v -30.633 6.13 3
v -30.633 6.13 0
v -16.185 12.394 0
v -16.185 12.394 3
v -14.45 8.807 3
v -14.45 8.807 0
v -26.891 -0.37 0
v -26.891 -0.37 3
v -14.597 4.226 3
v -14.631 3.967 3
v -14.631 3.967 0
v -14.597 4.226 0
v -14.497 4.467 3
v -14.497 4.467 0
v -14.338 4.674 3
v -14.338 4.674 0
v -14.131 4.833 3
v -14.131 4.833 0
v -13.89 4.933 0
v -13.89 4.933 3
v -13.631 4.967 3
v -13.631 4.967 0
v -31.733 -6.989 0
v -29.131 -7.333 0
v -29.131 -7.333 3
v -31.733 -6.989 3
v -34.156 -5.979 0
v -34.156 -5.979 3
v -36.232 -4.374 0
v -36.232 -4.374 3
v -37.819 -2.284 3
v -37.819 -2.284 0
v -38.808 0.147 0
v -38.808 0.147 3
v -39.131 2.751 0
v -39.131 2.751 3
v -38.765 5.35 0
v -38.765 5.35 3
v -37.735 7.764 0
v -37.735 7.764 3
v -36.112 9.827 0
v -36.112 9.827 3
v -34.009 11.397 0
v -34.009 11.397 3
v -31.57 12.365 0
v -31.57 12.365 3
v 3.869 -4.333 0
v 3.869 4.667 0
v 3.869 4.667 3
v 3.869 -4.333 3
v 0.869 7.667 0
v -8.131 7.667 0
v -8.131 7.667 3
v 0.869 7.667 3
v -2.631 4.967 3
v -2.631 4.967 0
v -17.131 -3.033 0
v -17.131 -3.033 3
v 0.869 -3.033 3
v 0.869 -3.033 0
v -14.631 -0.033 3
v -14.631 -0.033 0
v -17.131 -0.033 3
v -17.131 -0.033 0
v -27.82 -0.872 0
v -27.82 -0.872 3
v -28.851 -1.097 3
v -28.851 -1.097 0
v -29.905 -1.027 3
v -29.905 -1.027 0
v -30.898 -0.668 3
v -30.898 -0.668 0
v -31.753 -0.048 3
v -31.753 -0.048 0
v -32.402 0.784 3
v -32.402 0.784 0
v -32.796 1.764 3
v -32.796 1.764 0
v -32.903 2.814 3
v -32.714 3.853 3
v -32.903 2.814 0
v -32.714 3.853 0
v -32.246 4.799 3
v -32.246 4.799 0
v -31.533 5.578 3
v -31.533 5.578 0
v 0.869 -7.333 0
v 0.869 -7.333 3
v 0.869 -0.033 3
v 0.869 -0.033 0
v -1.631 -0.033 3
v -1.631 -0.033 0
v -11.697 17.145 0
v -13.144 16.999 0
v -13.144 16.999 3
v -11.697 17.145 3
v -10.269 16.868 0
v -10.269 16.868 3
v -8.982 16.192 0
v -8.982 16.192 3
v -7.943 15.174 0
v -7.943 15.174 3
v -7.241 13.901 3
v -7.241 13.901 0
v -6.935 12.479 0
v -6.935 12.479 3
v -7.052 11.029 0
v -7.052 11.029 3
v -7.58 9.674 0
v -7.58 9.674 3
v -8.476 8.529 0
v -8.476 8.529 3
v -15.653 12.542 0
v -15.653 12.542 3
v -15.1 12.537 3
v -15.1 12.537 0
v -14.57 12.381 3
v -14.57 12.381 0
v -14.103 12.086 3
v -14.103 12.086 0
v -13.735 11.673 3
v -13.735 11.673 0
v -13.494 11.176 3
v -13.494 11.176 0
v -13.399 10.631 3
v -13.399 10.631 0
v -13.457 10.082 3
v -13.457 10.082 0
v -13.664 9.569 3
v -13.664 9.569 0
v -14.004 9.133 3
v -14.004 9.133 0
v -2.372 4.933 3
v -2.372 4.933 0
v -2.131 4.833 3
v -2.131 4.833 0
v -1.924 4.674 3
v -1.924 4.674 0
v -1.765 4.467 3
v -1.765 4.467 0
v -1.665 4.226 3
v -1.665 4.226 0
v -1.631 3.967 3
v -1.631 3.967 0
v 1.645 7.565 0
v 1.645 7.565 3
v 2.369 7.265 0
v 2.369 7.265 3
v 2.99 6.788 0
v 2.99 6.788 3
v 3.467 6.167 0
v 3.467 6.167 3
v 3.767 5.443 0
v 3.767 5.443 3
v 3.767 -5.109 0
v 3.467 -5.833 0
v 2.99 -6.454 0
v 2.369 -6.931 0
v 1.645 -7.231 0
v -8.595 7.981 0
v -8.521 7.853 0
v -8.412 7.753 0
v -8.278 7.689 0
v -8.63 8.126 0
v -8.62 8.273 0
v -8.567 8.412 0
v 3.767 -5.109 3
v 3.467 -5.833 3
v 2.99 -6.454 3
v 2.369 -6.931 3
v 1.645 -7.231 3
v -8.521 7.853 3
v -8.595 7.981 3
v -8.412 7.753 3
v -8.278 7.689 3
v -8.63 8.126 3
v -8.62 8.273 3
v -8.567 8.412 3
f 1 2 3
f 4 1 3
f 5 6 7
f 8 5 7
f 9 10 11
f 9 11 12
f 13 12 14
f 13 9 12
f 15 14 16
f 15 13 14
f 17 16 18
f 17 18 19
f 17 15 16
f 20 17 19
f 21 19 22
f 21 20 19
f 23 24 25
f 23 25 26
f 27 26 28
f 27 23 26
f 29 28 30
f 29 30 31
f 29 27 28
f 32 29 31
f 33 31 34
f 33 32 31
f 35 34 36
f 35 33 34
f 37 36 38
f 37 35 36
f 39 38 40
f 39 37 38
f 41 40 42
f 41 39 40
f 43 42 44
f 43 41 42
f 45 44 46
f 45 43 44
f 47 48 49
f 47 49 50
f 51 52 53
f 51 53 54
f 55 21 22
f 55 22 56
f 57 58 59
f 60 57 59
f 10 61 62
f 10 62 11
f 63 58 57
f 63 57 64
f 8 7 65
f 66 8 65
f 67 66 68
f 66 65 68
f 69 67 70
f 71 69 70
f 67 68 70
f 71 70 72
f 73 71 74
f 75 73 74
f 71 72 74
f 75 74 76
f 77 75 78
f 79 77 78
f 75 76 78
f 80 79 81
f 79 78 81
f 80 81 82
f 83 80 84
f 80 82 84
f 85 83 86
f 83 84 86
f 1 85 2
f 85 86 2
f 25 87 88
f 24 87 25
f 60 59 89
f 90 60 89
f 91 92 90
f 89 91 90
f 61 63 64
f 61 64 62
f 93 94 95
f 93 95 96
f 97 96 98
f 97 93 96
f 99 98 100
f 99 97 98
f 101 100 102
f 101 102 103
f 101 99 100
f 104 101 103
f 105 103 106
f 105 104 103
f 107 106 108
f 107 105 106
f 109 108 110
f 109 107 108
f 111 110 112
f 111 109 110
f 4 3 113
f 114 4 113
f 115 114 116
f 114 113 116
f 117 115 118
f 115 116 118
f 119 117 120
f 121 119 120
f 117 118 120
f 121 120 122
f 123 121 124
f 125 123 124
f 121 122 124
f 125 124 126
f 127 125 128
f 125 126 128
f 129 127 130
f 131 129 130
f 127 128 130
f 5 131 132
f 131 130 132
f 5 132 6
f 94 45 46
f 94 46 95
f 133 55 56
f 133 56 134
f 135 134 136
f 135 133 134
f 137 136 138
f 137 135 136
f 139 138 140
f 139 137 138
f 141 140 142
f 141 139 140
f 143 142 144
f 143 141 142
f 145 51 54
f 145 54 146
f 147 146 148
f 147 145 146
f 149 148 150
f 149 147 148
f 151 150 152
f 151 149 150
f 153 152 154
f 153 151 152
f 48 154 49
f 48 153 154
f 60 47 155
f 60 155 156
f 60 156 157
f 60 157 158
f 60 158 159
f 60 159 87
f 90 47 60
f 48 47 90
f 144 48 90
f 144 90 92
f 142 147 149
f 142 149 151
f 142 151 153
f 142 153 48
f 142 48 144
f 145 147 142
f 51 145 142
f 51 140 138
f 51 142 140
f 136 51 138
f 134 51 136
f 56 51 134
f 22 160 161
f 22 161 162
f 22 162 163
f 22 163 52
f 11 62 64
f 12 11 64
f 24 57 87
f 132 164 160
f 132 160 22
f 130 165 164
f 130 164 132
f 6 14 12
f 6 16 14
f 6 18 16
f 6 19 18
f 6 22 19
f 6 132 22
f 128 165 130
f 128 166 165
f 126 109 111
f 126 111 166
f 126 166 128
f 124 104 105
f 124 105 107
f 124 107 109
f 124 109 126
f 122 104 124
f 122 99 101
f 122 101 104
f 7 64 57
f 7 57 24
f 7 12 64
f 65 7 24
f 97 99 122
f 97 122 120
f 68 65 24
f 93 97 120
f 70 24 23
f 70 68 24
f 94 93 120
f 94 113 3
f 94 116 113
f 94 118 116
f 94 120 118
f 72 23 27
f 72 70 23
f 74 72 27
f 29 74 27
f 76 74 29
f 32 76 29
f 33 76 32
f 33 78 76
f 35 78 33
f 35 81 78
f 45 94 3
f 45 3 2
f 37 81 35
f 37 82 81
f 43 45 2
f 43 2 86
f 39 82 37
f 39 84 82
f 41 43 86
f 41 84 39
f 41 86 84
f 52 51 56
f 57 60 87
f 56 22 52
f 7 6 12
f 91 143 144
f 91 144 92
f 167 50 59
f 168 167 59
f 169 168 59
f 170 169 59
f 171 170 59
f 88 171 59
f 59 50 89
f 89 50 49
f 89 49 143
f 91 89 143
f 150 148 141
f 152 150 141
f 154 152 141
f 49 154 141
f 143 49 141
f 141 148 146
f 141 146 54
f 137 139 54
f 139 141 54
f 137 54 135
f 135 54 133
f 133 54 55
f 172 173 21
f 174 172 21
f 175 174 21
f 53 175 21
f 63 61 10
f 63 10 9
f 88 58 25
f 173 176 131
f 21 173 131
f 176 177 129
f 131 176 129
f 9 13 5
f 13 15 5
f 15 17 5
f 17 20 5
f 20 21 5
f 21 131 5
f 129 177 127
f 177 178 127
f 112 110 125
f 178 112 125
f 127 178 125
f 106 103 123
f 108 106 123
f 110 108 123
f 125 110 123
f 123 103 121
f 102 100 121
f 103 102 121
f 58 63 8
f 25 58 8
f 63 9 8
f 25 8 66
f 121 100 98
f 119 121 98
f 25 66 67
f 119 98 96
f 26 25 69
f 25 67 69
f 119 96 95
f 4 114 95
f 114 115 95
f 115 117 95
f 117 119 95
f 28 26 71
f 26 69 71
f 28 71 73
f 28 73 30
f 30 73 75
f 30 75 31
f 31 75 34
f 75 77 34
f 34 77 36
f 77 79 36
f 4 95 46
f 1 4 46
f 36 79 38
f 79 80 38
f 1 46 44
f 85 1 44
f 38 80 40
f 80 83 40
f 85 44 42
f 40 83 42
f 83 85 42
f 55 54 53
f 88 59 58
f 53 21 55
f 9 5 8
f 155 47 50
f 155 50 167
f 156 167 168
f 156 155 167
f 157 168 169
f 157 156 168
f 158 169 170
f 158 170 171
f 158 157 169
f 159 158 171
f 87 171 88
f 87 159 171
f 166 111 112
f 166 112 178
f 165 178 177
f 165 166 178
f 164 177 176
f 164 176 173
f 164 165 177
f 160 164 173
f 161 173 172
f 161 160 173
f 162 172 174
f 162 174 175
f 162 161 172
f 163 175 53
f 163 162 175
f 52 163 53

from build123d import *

# Parameters (mm, degrees)
BOSS_EXTRUDE1_DEPTH = 3
SKETCH2_R           = 1.5
CUT_EXTRUDE1_DEPTH  = 3
CUT_EXTRUDE2_DEPTH  = 3
SKETCH5_W           = 18
SKETCH5_H           = 3
CUT_EXTRUDE3_DEPTH  = 3
CUT_EXTRUDE5_DEPTH  = 3


with BuildPart() as part:
    # Sketch1 → Boss-Extrude1 (new body)
    with BuildSketch(Plane.XY):
        with BuildLine():
            Line((3.868741846, 4.666984775), (3.868741846, -4.333015225))
            ThreePointArc((3.868741846, -4.333015225), (2.990062189, -6.454335569), (0.868741846, -7.333015225))
            Line((0.868741846, -7.333015225), (-29.131258154, -7.333015225))
            ThreePointArc((-29.131258154, -7.333015225), (-39.055484202, 1.438271074), (-31.570064658, 12.365037303))
            Line((-31.570064658, 12.365037303), (-13.143764854, 16.998769659))
            ThreePointArc((-13.143764854, 16.998769659), (-7.545321729, 14.563041923), (-8.476085741, 8.52905374))
            ThreePointArc((-8.476085741, 8.52905374), (-8.5954965, 7.981289437), (-8.131258154, 7.666984775))
            Line((-8.131258154, 7.666984775), (0.868741846, 7.666984775))
            ThreePointArc((0.868741846, 7.666984775), (2.990062189, 6.788305118), (3.868741846, 4.666984775))
        make_face()
    extrude(amount=BOSS_EXTRUDE1_DEPTH)

    # Sketch2 → Cut-Extrude1 (cut)
    with BuildSketch(Plane.XY.offset(3)):
        with Locations((-29.131258154, 2.666984775)):
            Circle(SKETCH2_R)
    extrude(amount=-CUT_EXTRUDE1_DEPTH, mode=Mode.SUBTRACT)

    # Sketch4 → Cut-Extrude2 (cut)
    with BuildSketch(Plane(origin=(0, 0, 0), x_dir=(-1, 0, 0), z_dir=(0, 0, -1))):
        with BuildLine():
            Line((30.632745307, 6.129616333), (16.185458015, 12.394336069))
            ThreePointArc((16.185458015, 12.394336069), (13.596850059, 11.433034125), (14.450350699, 8.806909749))
            Line((14.450350699, 8.806909749), (26.890771517, -0.370201523))
            ThreePointArc((26.890771517, -0.370201523), (32.402104849, 0.783943915), (30.632745307, 6.129616333))
        make_face()
    extrude(amount=-CUT_EXTRUDE2_DEPTH, mode=Mode.SUBTRACT)

    # Sketch5 → Cut-Extrude3 (cut)
    with BuildSketch(Plane.XY.offset(3)):
        with Locations((-8.131258154, -1.533015225)):
            Rectangle(SKETCH5_W, SKETCH5_H)
    extrude(amount=-CUT_EXTRUDE3_DEPTH, mode=Mode.SUBTRACT)

    # Sketch7 → Cut-Extrude5 (cut)
    with BuildSketch(Plane.XY.offset(3)):
        with BuildLine():
            Line((-14.631258154, -0.033015225), (-14.631258154, 3.966984775))
            ThreePointArc((-14.631258154, 3.966984775), (-14.338364936, 4.674091556), (-13.631258154, 4.966984775))
            Line((-13.631258154, 4.966984775), (-2.631258154, 4.966984775))
            ThreePointArc((-2.631258154, 4.966984775), (-1.924151373, 4.674091556), (-1.631258154, 3.966984775))
            Line((-1.631258154, 3.966984775), (-1.631258154, -0.033015225))
            Line((-1.631258154, -0.033015225), (-14.631258154, -0.033015225))
        make_face()
    extrude(amount=-CUT_EXTRUDE5_DEPTH, mode=Mode.SUBTRACT)


solid = part.part
